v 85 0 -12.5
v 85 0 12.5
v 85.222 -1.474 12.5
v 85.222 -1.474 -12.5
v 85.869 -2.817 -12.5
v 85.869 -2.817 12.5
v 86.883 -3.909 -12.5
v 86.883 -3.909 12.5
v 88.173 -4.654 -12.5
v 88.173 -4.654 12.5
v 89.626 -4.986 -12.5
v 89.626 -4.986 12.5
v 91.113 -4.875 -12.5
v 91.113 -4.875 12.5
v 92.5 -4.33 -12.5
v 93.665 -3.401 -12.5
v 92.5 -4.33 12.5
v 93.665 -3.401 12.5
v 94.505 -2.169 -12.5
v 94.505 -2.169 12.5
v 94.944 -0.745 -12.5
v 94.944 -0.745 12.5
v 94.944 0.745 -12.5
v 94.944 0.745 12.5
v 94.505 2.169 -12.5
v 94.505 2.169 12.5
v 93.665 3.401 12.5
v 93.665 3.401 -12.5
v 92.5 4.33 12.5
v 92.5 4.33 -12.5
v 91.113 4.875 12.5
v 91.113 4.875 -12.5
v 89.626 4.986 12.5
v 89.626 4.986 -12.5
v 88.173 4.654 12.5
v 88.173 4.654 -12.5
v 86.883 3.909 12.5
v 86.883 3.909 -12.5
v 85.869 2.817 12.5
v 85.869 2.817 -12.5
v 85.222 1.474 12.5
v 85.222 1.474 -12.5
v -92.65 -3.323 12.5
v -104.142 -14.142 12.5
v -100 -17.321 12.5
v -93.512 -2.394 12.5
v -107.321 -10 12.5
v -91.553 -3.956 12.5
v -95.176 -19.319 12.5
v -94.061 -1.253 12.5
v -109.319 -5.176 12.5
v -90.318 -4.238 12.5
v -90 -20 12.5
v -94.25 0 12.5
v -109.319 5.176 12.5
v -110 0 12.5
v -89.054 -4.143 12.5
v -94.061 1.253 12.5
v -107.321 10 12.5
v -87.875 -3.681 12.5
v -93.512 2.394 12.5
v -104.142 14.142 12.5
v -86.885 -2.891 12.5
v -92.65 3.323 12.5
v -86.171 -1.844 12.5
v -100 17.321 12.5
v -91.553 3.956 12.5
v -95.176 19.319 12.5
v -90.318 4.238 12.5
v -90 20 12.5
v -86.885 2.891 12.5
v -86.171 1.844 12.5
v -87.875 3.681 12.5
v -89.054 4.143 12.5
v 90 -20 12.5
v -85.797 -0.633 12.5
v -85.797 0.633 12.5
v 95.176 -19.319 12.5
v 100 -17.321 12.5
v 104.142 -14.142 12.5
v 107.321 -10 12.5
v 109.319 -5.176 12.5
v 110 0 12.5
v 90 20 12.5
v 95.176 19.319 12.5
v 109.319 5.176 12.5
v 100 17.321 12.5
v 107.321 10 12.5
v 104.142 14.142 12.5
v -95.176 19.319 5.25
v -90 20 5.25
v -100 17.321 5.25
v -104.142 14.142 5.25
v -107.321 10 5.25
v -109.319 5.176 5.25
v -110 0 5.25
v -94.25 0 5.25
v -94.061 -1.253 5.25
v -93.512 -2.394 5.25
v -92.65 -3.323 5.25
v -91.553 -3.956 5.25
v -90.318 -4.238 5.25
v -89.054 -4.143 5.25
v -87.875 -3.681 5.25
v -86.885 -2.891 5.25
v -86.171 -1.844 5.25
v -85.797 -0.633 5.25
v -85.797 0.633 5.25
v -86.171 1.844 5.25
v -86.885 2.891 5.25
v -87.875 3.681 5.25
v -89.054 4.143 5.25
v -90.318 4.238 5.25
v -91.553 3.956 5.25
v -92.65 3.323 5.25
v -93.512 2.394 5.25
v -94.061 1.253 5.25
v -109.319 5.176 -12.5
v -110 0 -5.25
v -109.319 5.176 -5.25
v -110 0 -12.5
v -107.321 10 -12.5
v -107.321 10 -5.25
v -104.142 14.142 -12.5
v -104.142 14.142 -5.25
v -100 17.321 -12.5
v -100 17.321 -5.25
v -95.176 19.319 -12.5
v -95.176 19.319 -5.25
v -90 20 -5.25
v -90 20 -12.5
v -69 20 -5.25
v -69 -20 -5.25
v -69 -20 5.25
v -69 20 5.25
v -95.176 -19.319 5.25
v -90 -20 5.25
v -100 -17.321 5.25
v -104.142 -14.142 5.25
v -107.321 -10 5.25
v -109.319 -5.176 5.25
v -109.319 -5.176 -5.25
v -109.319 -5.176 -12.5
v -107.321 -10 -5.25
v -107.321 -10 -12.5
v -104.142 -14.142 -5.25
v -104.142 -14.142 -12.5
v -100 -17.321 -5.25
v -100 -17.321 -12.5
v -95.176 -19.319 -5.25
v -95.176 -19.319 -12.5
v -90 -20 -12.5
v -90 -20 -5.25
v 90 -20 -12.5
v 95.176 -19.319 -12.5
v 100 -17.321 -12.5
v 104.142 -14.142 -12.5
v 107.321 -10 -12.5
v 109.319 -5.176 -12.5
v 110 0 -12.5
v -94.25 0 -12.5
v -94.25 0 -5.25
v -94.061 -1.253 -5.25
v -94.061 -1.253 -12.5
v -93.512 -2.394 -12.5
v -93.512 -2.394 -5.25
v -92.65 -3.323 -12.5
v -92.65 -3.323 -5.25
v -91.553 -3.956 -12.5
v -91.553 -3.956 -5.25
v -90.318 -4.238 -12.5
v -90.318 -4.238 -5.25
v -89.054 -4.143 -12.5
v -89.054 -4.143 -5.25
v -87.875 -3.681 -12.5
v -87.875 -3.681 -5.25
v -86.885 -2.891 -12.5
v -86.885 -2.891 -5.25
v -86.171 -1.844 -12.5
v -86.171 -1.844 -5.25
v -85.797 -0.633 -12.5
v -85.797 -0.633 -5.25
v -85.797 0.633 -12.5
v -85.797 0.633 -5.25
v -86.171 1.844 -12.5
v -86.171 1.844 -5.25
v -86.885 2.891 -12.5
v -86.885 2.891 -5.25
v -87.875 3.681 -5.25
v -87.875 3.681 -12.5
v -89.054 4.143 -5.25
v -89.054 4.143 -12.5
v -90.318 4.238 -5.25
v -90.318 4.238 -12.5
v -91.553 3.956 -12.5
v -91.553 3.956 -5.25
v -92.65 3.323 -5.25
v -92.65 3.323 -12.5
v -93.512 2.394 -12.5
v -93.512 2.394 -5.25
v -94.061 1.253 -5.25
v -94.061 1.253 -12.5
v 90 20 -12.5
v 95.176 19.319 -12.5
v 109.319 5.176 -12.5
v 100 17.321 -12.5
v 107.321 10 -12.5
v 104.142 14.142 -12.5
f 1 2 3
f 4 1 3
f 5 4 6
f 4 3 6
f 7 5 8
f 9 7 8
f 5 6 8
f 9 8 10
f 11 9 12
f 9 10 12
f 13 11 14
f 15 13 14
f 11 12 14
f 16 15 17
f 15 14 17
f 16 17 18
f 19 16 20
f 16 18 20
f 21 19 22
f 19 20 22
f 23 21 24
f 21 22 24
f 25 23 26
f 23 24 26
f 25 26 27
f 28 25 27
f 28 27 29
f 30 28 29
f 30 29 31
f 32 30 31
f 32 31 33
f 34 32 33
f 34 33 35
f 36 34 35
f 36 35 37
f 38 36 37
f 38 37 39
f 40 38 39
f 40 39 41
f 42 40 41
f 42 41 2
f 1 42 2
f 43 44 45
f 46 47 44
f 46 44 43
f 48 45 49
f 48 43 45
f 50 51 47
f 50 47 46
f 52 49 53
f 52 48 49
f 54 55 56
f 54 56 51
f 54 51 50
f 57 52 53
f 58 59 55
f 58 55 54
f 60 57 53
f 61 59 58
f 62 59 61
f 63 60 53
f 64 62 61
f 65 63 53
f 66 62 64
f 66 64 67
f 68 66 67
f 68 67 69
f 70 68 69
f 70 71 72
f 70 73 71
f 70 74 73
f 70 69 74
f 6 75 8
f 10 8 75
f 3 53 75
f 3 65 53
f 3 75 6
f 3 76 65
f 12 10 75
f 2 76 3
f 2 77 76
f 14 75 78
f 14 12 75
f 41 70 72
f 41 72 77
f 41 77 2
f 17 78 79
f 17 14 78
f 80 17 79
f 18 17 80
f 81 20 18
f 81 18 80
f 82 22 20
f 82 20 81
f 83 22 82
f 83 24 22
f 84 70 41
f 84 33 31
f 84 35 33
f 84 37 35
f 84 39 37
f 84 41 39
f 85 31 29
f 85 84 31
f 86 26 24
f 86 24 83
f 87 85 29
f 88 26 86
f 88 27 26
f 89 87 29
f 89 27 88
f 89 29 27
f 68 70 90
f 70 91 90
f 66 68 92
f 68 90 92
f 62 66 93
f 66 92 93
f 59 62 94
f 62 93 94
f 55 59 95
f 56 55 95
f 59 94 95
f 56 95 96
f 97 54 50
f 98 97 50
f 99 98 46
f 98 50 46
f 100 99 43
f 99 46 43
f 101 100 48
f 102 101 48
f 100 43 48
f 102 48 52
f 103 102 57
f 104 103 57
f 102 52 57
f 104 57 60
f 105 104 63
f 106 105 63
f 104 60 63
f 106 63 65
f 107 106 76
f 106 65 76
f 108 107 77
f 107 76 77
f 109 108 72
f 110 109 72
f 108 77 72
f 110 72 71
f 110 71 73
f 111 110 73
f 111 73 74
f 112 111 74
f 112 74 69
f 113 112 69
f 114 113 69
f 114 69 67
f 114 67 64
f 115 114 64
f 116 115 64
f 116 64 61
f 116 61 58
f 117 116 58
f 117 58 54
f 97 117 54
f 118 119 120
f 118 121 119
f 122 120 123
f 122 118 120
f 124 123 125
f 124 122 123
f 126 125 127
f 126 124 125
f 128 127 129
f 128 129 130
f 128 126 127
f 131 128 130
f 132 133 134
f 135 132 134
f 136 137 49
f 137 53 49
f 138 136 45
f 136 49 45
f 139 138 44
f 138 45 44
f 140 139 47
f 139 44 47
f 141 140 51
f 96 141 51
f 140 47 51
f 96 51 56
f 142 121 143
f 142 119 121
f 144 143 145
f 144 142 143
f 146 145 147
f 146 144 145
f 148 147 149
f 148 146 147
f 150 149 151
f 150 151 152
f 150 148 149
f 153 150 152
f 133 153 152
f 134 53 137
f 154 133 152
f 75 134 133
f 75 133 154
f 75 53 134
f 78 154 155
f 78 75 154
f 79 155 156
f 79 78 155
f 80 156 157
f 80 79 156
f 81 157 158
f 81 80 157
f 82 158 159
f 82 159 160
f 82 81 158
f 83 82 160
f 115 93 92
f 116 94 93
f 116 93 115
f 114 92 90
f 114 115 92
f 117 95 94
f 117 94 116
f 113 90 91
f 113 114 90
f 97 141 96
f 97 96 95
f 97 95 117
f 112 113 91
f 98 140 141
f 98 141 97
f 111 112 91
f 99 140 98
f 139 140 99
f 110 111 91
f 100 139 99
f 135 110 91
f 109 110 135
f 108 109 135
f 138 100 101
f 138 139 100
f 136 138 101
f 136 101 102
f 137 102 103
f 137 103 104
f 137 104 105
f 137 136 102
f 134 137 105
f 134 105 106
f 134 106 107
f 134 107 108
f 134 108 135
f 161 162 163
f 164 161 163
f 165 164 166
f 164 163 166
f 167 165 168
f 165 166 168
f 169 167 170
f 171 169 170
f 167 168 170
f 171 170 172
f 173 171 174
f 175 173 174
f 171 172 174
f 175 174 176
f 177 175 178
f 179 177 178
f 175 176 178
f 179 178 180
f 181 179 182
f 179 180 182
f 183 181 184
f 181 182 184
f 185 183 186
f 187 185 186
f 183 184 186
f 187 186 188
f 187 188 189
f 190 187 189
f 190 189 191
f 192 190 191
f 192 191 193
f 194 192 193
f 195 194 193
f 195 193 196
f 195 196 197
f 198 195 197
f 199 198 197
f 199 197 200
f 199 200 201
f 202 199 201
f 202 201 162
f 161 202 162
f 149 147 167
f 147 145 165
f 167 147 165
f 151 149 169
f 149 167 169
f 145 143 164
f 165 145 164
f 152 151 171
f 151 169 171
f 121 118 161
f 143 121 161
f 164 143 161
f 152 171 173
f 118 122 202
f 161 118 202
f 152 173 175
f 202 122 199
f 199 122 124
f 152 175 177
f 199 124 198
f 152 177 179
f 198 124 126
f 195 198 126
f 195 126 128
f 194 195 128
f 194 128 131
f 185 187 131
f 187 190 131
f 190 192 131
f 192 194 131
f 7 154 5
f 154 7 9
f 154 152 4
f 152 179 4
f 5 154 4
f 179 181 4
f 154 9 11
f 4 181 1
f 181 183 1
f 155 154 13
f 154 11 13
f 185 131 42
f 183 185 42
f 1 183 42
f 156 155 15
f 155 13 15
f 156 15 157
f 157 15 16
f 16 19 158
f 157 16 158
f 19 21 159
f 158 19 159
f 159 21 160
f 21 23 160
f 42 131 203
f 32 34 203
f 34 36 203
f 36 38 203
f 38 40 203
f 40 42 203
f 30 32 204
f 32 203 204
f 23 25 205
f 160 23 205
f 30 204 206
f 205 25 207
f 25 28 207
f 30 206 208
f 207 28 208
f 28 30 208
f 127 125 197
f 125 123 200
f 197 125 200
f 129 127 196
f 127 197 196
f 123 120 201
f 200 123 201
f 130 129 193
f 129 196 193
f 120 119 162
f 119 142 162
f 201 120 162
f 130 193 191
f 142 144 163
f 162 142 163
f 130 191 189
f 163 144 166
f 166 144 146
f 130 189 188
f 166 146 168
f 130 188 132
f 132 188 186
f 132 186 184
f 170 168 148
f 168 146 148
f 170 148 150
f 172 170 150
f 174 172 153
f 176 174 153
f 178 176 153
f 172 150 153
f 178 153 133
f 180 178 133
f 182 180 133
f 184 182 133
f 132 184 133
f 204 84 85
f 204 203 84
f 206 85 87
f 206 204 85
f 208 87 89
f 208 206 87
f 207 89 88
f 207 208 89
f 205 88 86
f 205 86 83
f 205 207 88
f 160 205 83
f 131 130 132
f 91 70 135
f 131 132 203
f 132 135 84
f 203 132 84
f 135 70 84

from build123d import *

# Parameters (mm, degrees)
F0_W     = 220
F0_H     = 40
F1_DEPTH = 12.5
F2_W     = 41
F2_H     = 10.5
F3_DEPTH = 20
F4_R     = 19.99999
F6_D     = 8.5
F8_D     = 10
F9_R     = 19.99999


# Not quite as in the source:
# - a fillet or chamfer is up to 0.001 mm smaller than in the source, because OpenCascade refuses the exact size


with BuildPart() as f1:
    # F0 (on Top) → F1 (new body, symmetric)
    with BuildSketch(Plane.XY):
        Rectangle(F0_W, F0_H)
    extrude(amount=F1_DEPTH, both=True)

    # F2 (on Front) → F3 (cut, symmetric)
    with BuildSketch(Plane.XZ):
        with Locations((-89.5, 0)):
            Rectangle(F2_W, F2_H)
    extrude(amount=F3_DEPTH, both=True, mode=Mode.SUBTRACT)

    # F4 (radius 20 in the source; OpenCascade refuses exactly that, so slightly less here)
    f4_edges = [f1.edges().sort_by_distance(p)[0] for p in [
        (-110, 20, 8.875),
        (-110, -20, 8.875),
        (-110, -20, -8.875),
        (-110, 20, -8.875),
    ]]
    fillet(f4_edges, radius=F4_R)

    # F6 (through all)
    with Locations(Plane(origin=(0, 0, -12.5), x_dir=(1, 0, 0), z_dir=(0, 0, -1))):
        with Locations((-90, 0)):
            Hole(F6_D / 2)

    # F8 (through all)
    with Locations(Plane(origin=(0, 0, -12.5), x_dir=(1, 0, 0), z_dir=(0, 0, -1))):
        with Locations((90, 0)):
            Hole(F8_D / 2)

    # F9 (radius 20 in the source; OpenCascade refuses exactly that, so slightly less here)
    f9_edges = [f1.edges().sort_by_distance(p)[0] for p in [
        (110, -20, 0),
        (110, 20, 0),
    ]]
    fillet(f9_edges, radius=F9_R)


solid = f1.part
